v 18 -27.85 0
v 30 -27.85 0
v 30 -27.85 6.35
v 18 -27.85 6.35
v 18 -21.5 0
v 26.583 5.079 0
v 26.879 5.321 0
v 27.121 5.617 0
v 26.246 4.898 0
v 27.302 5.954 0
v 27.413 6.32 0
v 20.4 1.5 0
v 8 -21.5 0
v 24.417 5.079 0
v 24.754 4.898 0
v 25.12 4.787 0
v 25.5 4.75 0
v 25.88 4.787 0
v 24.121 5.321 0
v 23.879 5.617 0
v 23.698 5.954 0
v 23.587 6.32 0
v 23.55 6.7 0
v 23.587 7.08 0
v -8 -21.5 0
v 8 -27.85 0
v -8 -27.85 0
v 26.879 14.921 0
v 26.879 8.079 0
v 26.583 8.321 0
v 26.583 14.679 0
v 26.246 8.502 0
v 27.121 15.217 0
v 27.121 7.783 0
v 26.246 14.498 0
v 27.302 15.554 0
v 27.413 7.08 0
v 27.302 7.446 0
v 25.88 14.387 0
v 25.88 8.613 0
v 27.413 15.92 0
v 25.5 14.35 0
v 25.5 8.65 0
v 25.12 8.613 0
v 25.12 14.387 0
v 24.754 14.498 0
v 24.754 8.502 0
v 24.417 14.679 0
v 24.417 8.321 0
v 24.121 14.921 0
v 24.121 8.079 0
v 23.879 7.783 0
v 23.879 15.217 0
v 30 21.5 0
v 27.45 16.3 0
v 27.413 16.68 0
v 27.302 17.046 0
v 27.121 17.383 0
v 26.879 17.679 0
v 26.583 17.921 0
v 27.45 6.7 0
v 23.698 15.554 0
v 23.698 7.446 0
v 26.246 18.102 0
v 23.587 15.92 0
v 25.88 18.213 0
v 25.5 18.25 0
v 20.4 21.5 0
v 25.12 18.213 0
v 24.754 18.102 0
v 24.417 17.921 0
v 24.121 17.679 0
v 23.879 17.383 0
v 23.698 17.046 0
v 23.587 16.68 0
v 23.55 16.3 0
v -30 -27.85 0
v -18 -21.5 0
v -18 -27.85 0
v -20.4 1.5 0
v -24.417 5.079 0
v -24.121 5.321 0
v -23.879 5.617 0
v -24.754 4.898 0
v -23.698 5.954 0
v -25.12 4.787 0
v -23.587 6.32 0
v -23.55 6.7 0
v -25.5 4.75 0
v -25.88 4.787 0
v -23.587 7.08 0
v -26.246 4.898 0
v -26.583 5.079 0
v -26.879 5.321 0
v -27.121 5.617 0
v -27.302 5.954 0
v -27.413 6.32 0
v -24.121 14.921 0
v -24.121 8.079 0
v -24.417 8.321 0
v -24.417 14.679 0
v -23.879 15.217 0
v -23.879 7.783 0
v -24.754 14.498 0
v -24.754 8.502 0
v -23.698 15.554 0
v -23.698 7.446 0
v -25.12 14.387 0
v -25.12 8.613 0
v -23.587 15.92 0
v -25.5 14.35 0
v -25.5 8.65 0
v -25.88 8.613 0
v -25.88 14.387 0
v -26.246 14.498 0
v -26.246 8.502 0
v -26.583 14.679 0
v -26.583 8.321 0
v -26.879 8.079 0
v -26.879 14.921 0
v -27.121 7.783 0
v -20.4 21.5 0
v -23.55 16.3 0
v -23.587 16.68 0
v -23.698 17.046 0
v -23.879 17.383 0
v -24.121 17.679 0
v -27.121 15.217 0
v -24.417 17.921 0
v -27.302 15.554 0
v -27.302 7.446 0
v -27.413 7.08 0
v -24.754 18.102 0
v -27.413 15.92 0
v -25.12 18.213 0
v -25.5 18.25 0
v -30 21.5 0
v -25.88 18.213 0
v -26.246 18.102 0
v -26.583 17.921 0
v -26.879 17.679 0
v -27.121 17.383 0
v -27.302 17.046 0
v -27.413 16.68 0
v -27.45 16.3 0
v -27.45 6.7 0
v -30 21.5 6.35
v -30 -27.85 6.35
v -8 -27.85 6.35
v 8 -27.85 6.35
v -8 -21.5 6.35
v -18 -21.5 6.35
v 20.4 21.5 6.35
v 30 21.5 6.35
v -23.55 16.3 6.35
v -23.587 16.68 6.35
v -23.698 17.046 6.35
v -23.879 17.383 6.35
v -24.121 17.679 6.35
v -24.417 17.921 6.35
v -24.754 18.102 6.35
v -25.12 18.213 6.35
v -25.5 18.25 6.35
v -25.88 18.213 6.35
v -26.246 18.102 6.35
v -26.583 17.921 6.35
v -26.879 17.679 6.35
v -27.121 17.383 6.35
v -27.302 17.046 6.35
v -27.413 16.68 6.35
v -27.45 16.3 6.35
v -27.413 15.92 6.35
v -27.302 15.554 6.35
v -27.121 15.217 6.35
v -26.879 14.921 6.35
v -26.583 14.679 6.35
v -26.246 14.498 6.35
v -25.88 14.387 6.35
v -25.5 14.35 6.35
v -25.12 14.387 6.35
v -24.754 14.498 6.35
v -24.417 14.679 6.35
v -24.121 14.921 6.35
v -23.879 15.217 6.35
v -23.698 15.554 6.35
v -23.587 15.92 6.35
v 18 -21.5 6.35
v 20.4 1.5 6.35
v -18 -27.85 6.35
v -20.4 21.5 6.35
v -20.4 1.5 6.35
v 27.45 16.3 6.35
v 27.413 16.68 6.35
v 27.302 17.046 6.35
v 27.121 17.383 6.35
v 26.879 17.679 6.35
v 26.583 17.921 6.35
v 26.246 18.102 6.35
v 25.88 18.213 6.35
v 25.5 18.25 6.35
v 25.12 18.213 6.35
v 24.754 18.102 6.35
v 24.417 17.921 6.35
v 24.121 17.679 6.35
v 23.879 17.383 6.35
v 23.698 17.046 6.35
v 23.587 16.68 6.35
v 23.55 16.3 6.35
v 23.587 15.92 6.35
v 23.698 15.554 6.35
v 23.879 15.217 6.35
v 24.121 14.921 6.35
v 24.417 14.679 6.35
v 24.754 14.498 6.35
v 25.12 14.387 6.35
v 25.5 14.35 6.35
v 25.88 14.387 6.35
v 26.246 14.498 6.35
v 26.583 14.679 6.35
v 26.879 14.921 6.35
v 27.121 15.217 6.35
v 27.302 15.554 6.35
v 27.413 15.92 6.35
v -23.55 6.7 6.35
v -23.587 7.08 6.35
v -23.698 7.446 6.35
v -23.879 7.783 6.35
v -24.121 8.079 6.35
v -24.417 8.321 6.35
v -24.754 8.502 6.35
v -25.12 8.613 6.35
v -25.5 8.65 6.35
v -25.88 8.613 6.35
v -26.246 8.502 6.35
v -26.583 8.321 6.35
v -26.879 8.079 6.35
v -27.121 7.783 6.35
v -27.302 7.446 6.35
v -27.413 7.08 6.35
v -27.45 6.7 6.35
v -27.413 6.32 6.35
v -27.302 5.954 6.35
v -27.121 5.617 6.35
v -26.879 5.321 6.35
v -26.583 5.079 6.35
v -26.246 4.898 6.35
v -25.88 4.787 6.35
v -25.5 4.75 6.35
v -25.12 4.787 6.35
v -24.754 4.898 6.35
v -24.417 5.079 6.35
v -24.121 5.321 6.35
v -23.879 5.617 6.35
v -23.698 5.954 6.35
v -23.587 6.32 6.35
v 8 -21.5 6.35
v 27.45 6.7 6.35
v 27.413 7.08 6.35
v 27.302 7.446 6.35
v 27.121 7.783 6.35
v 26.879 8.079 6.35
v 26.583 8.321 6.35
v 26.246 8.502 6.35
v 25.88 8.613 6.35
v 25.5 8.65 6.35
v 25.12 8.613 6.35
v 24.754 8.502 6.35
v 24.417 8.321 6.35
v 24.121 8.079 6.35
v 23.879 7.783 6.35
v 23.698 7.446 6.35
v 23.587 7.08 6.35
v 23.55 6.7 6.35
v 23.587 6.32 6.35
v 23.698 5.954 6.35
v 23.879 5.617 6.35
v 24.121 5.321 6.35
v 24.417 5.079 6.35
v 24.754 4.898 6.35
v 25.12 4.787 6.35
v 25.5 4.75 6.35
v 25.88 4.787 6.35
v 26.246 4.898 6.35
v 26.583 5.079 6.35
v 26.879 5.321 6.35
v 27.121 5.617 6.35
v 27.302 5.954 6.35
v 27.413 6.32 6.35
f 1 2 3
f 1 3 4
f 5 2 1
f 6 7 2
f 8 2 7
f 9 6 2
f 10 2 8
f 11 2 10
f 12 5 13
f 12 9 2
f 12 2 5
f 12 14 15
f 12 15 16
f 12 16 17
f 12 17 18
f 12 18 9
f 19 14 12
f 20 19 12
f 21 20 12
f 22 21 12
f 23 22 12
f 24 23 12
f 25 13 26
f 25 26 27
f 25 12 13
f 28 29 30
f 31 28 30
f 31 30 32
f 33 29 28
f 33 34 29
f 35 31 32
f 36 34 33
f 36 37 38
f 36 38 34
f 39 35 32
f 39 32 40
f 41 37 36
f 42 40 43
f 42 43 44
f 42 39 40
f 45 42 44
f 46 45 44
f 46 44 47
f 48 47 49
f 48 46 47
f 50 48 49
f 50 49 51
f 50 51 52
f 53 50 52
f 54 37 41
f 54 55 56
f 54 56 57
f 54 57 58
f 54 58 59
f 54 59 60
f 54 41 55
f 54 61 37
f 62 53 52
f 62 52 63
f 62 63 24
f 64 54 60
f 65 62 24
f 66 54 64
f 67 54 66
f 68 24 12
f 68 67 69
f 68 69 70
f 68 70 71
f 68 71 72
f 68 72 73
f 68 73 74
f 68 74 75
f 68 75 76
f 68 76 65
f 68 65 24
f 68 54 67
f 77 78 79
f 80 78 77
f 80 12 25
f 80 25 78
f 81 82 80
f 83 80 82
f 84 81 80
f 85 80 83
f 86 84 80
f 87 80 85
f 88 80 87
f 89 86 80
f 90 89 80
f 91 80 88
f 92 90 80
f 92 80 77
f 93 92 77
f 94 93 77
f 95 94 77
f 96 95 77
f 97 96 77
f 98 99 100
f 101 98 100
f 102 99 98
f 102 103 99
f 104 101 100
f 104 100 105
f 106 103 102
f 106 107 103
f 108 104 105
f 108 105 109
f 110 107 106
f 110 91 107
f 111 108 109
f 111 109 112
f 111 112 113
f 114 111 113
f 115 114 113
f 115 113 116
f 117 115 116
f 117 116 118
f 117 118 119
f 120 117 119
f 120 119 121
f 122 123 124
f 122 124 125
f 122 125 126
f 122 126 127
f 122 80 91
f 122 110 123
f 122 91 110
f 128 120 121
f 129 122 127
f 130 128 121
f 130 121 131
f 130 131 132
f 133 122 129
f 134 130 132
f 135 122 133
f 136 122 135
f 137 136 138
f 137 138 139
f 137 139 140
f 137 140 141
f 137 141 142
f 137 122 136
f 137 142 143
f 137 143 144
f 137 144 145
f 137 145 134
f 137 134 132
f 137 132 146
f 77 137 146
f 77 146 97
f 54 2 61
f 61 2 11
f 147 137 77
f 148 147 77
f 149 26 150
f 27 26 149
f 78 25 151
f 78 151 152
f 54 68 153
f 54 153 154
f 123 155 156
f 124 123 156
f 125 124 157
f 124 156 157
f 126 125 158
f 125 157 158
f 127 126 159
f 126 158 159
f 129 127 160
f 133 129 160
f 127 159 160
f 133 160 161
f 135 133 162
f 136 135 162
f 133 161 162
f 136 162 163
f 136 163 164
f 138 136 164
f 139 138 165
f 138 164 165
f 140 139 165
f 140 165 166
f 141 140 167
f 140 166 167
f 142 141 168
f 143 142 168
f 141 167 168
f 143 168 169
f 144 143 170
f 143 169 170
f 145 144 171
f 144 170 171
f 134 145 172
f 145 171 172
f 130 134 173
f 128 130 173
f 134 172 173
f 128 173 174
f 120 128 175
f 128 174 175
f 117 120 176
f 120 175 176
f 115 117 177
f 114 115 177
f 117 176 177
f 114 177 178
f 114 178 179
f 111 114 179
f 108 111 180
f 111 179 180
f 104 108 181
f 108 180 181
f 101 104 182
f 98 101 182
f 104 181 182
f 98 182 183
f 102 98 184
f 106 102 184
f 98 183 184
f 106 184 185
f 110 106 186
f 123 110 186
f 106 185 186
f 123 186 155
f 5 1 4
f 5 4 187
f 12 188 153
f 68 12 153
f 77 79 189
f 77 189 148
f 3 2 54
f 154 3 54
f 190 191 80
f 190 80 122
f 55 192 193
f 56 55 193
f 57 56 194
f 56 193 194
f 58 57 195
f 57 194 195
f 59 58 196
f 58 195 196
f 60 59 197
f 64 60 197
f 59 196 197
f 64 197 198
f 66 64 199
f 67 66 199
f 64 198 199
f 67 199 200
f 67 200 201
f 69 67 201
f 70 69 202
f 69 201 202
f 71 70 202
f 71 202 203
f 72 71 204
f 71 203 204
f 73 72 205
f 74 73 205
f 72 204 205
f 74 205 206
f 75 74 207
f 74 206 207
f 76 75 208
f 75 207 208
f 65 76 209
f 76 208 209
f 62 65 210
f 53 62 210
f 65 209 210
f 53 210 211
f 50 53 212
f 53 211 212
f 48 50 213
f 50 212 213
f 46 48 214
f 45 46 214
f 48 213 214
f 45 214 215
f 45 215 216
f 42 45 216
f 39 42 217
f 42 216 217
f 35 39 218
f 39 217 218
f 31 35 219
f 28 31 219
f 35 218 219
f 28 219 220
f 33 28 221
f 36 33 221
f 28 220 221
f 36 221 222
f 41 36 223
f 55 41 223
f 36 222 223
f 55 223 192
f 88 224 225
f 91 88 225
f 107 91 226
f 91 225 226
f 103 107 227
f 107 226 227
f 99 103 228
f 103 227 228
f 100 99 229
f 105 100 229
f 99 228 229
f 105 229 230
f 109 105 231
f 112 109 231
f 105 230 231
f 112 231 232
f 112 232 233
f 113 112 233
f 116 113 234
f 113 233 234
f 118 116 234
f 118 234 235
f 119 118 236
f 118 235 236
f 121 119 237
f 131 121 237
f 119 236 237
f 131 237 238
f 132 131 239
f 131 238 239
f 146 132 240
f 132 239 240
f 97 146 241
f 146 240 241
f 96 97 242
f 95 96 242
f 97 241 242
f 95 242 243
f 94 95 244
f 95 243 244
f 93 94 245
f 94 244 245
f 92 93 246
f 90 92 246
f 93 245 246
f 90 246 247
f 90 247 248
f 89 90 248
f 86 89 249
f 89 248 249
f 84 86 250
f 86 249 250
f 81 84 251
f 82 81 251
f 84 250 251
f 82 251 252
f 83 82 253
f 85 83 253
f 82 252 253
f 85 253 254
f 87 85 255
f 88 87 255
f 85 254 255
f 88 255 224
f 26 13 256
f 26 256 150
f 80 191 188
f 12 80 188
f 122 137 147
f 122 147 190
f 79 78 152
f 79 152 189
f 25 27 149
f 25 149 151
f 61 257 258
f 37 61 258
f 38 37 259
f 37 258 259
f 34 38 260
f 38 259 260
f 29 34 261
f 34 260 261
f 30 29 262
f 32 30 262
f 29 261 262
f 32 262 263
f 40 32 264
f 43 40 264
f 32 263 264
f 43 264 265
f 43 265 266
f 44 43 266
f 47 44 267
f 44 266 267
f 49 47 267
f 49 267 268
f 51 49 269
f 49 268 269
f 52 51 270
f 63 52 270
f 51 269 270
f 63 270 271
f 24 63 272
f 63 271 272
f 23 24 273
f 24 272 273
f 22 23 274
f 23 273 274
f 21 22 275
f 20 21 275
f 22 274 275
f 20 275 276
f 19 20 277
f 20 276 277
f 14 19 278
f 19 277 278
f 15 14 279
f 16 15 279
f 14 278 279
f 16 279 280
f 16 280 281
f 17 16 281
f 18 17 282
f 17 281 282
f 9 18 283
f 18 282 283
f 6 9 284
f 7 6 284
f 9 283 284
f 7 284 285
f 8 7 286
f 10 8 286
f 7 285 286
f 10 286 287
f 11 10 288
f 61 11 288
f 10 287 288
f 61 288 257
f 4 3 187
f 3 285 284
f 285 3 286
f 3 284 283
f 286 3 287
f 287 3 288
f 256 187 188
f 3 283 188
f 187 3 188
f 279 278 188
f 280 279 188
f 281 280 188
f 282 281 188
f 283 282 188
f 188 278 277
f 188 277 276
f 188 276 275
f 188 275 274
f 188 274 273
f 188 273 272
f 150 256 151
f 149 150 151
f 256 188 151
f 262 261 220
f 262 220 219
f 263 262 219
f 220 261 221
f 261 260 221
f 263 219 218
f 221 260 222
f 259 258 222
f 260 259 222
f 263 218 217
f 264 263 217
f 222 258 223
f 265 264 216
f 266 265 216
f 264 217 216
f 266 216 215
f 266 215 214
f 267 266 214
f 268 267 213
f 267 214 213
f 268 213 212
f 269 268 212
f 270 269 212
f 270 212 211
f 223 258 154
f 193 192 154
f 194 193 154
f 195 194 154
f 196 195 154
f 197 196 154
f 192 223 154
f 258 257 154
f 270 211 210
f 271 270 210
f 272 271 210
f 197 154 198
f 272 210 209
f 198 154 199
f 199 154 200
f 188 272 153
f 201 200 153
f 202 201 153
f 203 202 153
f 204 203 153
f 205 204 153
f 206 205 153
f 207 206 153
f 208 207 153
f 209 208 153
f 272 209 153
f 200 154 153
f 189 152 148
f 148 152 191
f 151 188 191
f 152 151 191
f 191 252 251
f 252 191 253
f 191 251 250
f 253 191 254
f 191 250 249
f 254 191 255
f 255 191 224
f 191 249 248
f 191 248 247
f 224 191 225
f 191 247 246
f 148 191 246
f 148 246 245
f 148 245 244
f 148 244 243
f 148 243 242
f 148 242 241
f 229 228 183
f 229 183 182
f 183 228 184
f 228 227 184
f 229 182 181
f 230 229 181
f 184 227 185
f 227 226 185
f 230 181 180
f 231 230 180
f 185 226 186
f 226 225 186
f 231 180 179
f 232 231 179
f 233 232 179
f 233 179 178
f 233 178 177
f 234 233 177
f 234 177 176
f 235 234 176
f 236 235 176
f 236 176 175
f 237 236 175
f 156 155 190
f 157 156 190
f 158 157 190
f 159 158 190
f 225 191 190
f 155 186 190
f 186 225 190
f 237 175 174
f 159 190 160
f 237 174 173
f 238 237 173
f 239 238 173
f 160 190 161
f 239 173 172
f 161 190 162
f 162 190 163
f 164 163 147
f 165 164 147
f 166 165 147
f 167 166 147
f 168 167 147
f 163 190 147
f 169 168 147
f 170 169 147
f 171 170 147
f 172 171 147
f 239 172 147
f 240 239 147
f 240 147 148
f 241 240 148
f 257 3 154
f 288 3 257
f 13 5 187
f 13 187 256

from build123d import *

# Parameters (mm, degrees)
BOSS_EXTRUDE1_DEPTH = 6.35
SKETCH2_R           = 1.95
SKETCH2_W           = 40.8
SKETCH2_H           = 20
CUT_EXTRUDE1_DEPTH  = 6.35


with BuildPart() as part:
    # Sketch1 → Boss-Extrude1 (new body)
    with BuildSketch(Plane.XY):
        Polygon((-30, -21.5), (-30, 21.5), (30, 21.5), (30, -21.5), (30, -27.85), (18, -27.85), (18, -21.5), (8, -21.5), (8, -27.85), (-8, -27.85), (-8, -21.5), (-18, -21.5), (-18, -27.85), (-30, -27.85), align=None)
    extrude(amount=BOSS_EXTRUDE1_DEPTH)

    # Sketch2 → Cut-Extrude1 (cut)
    with BuildSketch(Plane.XY.offset(6.35)):
        with Locations((-25.5, 16.3)):
            Circle(SKETCH2_R)
        with Locations((-25.5, 6.7)):
            Circle(SKETCH2_R)
        with Locations((25.5, 6.7)):
            Circle(SKETCH2_R)
        with Locations((25.5, 16.3)):
            Circle(SKETCH2_R)
        with Locations((0, 11.5)):
            Rectangle(SKETCH2_W, SKETCH2_H)
    extrude(amount=-CUT_EXTRUDE1_DEPTH, mode=Mode.SUBTRACT)


solid = part.part
